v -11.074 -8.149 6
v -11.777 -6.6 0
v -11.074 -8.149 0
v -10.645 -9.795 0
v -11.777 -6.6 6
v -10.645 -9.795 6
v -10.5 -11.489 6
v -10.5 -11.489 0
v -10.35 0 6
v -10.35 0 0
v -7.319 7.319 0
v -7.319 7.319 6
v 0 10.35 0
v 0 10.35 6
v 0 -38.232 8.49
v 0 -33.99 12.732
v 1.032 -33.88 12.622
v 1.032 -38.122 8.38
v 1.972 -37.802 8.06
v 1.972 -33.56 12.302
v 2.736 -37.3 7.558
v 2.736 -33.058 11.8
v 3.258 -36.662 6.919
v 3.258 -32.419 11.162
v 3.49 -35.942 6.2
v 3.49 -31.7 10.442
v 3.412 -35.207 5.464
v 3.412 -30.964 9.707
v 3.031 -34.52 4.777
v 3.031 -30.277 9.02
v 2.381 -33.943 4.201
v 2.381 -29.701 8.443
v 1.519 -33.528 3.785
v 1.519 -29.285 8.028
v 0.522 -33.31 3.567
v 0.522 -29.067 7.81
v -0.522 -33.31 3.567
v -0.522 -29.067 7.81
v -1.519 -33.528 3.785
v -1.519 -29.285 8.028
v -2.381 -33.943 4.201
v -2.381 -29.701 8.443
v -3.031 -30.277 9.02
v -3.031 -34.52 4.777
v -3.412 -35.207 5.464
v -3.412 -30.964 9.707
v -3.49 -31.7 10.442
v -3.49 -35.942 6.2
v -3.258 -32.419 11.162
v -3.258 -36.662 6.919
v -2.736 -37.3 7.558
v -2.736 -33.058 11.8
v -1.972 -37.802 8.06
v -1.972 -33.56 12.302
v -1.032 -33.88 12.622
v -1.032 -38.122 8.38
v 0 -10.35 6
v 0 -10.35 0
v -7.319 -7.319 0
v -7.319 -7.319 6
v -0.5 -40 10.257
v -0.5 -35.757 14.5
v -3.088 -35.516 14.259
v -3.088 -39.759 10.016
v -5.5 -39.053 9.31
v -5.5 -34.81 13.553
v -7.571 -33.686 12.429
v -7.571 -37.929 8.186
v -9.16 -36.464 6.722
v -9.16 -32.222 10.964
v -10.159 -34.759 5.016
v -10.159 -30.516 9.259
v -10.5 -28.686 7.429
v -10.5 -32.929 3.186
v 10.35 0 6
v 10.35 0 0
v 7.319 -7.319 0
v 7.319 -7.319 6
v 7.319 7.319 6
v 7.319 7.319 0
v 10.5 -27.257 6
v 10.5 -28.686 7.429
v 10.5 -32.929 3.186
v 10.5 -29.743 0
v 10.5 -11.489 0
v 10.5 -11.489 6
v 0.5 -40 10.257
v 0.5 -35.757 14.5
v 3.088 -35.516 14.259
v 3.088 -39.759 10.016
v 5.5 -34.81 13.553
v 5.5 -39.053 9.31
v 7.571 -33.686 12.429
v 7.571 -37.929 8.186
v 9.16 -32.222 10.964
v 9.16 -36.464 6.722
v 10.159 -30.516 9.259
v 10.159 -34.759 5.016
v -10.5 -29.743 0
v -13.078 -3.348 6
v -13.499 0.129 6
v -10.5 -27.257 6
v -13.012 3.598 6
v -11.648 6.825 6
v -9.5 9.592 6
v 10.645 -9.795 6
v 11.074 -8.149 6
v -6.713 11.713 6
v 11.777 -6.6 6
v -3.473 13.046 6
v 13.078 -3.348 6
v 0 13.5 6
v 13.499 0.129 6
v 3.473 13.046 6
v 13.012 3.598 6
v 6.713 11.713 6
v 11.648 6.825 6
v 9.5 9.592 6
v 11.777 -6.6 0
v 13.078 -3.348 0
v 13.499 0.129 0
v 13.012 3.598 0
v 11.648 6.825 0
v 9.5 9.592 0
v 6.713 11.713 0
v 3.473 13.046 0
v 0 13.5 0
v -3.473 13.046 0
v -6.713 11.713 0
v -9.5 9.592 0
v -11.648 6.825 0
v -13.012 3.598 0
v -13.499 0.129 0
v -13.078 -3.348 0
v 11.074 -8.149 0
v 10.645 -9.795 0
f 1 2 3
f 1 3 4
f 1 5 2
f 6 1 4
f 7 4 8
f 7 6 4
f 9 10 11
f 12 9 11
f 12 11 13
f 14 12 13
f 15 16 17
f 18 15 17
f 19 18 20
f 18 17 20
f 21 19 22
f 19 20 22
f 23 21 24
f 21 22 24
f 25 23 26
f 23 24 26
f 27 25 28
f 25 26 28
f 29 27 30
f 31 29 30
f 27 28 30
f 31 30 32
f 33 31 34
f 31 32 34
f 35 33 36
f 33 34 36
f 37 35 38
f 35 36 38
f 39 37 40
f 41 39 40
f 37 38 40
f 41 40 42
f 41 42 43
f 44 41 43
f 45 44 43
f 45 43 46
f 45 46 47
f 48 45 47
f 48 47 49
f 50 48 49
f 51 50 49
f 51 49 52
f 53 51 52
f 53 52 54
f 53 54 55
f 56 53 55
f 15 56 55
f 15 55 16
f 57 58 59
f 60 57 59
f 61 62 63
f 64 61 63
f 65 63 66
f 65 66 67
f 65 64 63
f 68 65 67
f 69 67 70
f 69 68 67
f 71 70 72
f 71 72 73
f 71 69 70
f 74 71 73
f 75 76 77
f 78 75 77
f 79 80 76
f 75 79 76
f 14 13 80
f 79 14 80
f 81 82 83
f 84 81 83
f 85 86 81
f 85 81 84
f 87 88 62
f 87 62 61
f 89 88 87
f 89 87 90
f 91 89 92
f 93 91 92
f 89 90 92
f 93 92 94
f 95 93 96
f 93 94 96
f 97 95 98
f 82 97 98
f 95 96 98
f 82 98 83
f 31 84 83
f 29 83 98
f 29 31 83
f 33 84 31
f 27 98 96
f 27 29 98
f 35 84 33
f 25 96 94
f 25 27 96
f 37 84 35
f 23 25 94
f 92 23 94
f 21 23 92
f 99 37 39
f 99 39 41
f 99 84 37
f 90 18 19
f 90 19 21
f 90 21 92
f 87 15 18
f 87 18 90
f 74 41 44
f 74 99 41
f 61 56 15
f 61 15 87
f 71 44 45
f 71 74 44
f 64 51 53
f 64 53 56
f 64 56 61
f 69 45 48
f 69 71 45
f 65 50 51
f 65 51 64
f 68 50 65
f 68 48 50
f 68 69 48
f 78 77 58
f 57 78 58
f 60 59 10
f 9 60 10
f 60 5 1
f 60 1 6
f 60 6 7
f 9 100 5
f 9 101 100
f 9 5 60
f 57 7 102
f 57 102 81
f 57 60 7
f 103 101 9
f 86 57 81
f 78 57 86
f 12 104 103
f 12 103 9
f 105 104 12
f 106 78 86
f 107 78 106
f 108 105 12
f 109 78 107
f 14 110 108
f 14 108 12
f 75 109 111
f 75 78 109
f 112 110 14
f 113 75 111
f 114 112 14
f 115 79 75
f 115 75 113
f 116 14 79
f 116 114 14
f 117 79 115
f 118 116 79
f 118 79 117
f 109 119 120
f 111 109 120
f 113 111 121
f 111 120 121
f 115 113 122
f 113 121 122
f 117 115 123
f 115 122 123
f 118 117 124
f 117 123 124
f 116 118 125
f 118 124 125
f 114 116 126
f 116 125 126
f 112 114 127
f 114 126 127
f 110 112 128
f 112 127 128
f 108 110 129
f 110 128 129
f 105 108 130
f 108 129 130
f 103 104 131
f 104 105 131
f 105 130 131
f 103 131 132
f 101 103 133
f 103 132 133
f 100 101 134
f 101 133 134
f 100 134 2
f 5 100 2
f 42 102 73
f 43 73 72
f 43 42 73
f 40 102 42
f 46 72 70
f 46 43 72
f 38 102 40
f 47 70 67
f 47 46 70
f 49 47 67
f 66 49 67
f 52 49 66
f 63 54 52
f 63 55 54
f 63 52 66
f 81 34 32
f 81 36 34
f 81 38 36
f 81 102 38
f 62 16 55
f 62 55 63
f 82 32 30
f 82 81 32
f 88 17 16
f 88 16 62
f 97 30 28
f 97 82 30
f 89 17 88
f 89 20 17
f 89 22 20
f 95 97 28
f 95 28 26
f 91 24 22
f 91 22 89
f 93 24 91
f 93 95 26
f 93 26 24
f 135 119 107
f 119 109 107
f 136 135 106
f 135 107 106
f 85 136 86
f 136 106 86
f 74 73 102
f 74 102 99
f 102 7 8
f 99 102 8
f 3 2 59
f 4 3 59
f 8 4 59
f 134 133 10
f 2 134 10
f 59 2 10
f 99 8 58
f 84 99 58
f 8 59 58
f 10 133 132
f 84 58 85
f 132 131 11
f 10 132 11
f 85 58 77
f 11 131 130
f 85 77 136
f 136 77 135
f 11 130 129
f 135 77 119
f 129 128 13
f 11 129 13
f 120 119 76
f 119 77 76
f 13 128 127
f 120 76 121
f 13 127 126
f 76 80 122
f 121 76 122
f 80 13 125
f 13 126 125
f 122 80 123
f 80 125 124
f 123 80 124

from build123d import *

# Parameters (mm, degrees)
SKETCH_1_R               = 13.5
EXTRUDE_1_DEPTH          = 6
EXTRUDE_START            = -6
EXTRUDE_2_DEPTH          = 6
EXTRUDE_3_DEPTH          = 21
SKETCH_5_R               = 3.5
CUT_EXTRUDE_1_DEPTH      = 41.943558712
CUT_EXTRUDE_3_DEPTH      = 49.849257927
CUT_EXTRUDE_3_DEPTH_BACK = 49.849257927
FILLET_3_R               = 10


with BuildPart() as part:
    # 草图1 → 凸台-拉伸1 (new body)
    with BuildSketch(Plane.XY):
        Circle(SKETCH_1_R)
        Polygon((10.35, 0), (7.318555185, -7.318555185), (0, -10.35), (-7.318555185, -7.318555185), (-10.35, 0), (-7.318555185, 7.318555185), (0, 10.35), (7.318555185, 7.318555185), align=None, mode=Mode.SUBTRACT)
    extrude(amount=EXTRUDE_1_DEPTH)

    # 草图2 → 凸台-拉伸2 (add)
    with BuildSketch(Plane.XY.offset(6).offset(EXTRUDE_START)):
        with BuildLine():
            Line((-10.5, -8.485281374), (-10.5, -30))
            Line((-10.5, -30), (10.5, -30))
            Line((10.5, -30), (10.5, -8.485281374))
            ThreePointArc((10.5, -8.485281374), (0, -13.5), (-10.5, -8.485281374))
        make_face()
    extrude(amount=EXTRUDE_2_DEPTH)

    # 草图4 → 凸台-拉伸3 (add)
    with BuildSketch(Plane(origin=(10.5, 0, 0), x_dir=(0, 0, -1), z_dir=(1, 0, 0))):
        Polygon((-6, -27.257359313), (-14.5, -35.757359313), (-10.257359313, -40), (0, -29.742640687), align=None)
    extrude(amount=-EXTRUDE_3_DEPTH)

    # 草图5 → 切除-拉伸1 (cut, through all)
    with BuildSketch(Plane(origin=(0, -10.628679656, -10.628679656), x_dir=(1, 0, 0), z_dir=(0, 0.7071067811865436, 0.7071067811865515))):
        with Locations(Location((0, -29.537319575, 0), (0, 0, 270))):
            Circle(SKETCH_5_R)
    extrude(amount=-CUT_EXTRUDE_1_DEPTH, mode=Mode.SUBTRACT)

    # 草图6 → 切除-拉伸3 (cut, two sides: drawn at the far end of the back side and taken through both)
    with BuildSketch(Plane(origin=(10.5, 0, 0), x_dir=(0, 0, -1), z_dir=(1, 0, 0)).offset(-CUT_EXTRUDE_3_DEPTH_BACK)):
        Polygon((0, -29.742640687), (-0.257359313, -30), (0, -30), align=None)
    extrude(amount=CUT_EXTRUDE_3_DEPTH + CUT_EXTRUDE_3_DEPTH_BACK, mode=Mode.SUBTRACT)

    # 圆角3
    fillet_3_edges = [part.edges().sort_by_distance(p)[0] for p in [
        (-10.5, -8.485281374, 3),
        (10.5, -8.485281374, 3),
        (-10.5, -37.878679656, 12.378679656),
        (10.5, -37.878679656, 12.378679656),
    ]]
    fillet(fillet_3_edges, radius=FILLET_3_R)


solid = part.part
